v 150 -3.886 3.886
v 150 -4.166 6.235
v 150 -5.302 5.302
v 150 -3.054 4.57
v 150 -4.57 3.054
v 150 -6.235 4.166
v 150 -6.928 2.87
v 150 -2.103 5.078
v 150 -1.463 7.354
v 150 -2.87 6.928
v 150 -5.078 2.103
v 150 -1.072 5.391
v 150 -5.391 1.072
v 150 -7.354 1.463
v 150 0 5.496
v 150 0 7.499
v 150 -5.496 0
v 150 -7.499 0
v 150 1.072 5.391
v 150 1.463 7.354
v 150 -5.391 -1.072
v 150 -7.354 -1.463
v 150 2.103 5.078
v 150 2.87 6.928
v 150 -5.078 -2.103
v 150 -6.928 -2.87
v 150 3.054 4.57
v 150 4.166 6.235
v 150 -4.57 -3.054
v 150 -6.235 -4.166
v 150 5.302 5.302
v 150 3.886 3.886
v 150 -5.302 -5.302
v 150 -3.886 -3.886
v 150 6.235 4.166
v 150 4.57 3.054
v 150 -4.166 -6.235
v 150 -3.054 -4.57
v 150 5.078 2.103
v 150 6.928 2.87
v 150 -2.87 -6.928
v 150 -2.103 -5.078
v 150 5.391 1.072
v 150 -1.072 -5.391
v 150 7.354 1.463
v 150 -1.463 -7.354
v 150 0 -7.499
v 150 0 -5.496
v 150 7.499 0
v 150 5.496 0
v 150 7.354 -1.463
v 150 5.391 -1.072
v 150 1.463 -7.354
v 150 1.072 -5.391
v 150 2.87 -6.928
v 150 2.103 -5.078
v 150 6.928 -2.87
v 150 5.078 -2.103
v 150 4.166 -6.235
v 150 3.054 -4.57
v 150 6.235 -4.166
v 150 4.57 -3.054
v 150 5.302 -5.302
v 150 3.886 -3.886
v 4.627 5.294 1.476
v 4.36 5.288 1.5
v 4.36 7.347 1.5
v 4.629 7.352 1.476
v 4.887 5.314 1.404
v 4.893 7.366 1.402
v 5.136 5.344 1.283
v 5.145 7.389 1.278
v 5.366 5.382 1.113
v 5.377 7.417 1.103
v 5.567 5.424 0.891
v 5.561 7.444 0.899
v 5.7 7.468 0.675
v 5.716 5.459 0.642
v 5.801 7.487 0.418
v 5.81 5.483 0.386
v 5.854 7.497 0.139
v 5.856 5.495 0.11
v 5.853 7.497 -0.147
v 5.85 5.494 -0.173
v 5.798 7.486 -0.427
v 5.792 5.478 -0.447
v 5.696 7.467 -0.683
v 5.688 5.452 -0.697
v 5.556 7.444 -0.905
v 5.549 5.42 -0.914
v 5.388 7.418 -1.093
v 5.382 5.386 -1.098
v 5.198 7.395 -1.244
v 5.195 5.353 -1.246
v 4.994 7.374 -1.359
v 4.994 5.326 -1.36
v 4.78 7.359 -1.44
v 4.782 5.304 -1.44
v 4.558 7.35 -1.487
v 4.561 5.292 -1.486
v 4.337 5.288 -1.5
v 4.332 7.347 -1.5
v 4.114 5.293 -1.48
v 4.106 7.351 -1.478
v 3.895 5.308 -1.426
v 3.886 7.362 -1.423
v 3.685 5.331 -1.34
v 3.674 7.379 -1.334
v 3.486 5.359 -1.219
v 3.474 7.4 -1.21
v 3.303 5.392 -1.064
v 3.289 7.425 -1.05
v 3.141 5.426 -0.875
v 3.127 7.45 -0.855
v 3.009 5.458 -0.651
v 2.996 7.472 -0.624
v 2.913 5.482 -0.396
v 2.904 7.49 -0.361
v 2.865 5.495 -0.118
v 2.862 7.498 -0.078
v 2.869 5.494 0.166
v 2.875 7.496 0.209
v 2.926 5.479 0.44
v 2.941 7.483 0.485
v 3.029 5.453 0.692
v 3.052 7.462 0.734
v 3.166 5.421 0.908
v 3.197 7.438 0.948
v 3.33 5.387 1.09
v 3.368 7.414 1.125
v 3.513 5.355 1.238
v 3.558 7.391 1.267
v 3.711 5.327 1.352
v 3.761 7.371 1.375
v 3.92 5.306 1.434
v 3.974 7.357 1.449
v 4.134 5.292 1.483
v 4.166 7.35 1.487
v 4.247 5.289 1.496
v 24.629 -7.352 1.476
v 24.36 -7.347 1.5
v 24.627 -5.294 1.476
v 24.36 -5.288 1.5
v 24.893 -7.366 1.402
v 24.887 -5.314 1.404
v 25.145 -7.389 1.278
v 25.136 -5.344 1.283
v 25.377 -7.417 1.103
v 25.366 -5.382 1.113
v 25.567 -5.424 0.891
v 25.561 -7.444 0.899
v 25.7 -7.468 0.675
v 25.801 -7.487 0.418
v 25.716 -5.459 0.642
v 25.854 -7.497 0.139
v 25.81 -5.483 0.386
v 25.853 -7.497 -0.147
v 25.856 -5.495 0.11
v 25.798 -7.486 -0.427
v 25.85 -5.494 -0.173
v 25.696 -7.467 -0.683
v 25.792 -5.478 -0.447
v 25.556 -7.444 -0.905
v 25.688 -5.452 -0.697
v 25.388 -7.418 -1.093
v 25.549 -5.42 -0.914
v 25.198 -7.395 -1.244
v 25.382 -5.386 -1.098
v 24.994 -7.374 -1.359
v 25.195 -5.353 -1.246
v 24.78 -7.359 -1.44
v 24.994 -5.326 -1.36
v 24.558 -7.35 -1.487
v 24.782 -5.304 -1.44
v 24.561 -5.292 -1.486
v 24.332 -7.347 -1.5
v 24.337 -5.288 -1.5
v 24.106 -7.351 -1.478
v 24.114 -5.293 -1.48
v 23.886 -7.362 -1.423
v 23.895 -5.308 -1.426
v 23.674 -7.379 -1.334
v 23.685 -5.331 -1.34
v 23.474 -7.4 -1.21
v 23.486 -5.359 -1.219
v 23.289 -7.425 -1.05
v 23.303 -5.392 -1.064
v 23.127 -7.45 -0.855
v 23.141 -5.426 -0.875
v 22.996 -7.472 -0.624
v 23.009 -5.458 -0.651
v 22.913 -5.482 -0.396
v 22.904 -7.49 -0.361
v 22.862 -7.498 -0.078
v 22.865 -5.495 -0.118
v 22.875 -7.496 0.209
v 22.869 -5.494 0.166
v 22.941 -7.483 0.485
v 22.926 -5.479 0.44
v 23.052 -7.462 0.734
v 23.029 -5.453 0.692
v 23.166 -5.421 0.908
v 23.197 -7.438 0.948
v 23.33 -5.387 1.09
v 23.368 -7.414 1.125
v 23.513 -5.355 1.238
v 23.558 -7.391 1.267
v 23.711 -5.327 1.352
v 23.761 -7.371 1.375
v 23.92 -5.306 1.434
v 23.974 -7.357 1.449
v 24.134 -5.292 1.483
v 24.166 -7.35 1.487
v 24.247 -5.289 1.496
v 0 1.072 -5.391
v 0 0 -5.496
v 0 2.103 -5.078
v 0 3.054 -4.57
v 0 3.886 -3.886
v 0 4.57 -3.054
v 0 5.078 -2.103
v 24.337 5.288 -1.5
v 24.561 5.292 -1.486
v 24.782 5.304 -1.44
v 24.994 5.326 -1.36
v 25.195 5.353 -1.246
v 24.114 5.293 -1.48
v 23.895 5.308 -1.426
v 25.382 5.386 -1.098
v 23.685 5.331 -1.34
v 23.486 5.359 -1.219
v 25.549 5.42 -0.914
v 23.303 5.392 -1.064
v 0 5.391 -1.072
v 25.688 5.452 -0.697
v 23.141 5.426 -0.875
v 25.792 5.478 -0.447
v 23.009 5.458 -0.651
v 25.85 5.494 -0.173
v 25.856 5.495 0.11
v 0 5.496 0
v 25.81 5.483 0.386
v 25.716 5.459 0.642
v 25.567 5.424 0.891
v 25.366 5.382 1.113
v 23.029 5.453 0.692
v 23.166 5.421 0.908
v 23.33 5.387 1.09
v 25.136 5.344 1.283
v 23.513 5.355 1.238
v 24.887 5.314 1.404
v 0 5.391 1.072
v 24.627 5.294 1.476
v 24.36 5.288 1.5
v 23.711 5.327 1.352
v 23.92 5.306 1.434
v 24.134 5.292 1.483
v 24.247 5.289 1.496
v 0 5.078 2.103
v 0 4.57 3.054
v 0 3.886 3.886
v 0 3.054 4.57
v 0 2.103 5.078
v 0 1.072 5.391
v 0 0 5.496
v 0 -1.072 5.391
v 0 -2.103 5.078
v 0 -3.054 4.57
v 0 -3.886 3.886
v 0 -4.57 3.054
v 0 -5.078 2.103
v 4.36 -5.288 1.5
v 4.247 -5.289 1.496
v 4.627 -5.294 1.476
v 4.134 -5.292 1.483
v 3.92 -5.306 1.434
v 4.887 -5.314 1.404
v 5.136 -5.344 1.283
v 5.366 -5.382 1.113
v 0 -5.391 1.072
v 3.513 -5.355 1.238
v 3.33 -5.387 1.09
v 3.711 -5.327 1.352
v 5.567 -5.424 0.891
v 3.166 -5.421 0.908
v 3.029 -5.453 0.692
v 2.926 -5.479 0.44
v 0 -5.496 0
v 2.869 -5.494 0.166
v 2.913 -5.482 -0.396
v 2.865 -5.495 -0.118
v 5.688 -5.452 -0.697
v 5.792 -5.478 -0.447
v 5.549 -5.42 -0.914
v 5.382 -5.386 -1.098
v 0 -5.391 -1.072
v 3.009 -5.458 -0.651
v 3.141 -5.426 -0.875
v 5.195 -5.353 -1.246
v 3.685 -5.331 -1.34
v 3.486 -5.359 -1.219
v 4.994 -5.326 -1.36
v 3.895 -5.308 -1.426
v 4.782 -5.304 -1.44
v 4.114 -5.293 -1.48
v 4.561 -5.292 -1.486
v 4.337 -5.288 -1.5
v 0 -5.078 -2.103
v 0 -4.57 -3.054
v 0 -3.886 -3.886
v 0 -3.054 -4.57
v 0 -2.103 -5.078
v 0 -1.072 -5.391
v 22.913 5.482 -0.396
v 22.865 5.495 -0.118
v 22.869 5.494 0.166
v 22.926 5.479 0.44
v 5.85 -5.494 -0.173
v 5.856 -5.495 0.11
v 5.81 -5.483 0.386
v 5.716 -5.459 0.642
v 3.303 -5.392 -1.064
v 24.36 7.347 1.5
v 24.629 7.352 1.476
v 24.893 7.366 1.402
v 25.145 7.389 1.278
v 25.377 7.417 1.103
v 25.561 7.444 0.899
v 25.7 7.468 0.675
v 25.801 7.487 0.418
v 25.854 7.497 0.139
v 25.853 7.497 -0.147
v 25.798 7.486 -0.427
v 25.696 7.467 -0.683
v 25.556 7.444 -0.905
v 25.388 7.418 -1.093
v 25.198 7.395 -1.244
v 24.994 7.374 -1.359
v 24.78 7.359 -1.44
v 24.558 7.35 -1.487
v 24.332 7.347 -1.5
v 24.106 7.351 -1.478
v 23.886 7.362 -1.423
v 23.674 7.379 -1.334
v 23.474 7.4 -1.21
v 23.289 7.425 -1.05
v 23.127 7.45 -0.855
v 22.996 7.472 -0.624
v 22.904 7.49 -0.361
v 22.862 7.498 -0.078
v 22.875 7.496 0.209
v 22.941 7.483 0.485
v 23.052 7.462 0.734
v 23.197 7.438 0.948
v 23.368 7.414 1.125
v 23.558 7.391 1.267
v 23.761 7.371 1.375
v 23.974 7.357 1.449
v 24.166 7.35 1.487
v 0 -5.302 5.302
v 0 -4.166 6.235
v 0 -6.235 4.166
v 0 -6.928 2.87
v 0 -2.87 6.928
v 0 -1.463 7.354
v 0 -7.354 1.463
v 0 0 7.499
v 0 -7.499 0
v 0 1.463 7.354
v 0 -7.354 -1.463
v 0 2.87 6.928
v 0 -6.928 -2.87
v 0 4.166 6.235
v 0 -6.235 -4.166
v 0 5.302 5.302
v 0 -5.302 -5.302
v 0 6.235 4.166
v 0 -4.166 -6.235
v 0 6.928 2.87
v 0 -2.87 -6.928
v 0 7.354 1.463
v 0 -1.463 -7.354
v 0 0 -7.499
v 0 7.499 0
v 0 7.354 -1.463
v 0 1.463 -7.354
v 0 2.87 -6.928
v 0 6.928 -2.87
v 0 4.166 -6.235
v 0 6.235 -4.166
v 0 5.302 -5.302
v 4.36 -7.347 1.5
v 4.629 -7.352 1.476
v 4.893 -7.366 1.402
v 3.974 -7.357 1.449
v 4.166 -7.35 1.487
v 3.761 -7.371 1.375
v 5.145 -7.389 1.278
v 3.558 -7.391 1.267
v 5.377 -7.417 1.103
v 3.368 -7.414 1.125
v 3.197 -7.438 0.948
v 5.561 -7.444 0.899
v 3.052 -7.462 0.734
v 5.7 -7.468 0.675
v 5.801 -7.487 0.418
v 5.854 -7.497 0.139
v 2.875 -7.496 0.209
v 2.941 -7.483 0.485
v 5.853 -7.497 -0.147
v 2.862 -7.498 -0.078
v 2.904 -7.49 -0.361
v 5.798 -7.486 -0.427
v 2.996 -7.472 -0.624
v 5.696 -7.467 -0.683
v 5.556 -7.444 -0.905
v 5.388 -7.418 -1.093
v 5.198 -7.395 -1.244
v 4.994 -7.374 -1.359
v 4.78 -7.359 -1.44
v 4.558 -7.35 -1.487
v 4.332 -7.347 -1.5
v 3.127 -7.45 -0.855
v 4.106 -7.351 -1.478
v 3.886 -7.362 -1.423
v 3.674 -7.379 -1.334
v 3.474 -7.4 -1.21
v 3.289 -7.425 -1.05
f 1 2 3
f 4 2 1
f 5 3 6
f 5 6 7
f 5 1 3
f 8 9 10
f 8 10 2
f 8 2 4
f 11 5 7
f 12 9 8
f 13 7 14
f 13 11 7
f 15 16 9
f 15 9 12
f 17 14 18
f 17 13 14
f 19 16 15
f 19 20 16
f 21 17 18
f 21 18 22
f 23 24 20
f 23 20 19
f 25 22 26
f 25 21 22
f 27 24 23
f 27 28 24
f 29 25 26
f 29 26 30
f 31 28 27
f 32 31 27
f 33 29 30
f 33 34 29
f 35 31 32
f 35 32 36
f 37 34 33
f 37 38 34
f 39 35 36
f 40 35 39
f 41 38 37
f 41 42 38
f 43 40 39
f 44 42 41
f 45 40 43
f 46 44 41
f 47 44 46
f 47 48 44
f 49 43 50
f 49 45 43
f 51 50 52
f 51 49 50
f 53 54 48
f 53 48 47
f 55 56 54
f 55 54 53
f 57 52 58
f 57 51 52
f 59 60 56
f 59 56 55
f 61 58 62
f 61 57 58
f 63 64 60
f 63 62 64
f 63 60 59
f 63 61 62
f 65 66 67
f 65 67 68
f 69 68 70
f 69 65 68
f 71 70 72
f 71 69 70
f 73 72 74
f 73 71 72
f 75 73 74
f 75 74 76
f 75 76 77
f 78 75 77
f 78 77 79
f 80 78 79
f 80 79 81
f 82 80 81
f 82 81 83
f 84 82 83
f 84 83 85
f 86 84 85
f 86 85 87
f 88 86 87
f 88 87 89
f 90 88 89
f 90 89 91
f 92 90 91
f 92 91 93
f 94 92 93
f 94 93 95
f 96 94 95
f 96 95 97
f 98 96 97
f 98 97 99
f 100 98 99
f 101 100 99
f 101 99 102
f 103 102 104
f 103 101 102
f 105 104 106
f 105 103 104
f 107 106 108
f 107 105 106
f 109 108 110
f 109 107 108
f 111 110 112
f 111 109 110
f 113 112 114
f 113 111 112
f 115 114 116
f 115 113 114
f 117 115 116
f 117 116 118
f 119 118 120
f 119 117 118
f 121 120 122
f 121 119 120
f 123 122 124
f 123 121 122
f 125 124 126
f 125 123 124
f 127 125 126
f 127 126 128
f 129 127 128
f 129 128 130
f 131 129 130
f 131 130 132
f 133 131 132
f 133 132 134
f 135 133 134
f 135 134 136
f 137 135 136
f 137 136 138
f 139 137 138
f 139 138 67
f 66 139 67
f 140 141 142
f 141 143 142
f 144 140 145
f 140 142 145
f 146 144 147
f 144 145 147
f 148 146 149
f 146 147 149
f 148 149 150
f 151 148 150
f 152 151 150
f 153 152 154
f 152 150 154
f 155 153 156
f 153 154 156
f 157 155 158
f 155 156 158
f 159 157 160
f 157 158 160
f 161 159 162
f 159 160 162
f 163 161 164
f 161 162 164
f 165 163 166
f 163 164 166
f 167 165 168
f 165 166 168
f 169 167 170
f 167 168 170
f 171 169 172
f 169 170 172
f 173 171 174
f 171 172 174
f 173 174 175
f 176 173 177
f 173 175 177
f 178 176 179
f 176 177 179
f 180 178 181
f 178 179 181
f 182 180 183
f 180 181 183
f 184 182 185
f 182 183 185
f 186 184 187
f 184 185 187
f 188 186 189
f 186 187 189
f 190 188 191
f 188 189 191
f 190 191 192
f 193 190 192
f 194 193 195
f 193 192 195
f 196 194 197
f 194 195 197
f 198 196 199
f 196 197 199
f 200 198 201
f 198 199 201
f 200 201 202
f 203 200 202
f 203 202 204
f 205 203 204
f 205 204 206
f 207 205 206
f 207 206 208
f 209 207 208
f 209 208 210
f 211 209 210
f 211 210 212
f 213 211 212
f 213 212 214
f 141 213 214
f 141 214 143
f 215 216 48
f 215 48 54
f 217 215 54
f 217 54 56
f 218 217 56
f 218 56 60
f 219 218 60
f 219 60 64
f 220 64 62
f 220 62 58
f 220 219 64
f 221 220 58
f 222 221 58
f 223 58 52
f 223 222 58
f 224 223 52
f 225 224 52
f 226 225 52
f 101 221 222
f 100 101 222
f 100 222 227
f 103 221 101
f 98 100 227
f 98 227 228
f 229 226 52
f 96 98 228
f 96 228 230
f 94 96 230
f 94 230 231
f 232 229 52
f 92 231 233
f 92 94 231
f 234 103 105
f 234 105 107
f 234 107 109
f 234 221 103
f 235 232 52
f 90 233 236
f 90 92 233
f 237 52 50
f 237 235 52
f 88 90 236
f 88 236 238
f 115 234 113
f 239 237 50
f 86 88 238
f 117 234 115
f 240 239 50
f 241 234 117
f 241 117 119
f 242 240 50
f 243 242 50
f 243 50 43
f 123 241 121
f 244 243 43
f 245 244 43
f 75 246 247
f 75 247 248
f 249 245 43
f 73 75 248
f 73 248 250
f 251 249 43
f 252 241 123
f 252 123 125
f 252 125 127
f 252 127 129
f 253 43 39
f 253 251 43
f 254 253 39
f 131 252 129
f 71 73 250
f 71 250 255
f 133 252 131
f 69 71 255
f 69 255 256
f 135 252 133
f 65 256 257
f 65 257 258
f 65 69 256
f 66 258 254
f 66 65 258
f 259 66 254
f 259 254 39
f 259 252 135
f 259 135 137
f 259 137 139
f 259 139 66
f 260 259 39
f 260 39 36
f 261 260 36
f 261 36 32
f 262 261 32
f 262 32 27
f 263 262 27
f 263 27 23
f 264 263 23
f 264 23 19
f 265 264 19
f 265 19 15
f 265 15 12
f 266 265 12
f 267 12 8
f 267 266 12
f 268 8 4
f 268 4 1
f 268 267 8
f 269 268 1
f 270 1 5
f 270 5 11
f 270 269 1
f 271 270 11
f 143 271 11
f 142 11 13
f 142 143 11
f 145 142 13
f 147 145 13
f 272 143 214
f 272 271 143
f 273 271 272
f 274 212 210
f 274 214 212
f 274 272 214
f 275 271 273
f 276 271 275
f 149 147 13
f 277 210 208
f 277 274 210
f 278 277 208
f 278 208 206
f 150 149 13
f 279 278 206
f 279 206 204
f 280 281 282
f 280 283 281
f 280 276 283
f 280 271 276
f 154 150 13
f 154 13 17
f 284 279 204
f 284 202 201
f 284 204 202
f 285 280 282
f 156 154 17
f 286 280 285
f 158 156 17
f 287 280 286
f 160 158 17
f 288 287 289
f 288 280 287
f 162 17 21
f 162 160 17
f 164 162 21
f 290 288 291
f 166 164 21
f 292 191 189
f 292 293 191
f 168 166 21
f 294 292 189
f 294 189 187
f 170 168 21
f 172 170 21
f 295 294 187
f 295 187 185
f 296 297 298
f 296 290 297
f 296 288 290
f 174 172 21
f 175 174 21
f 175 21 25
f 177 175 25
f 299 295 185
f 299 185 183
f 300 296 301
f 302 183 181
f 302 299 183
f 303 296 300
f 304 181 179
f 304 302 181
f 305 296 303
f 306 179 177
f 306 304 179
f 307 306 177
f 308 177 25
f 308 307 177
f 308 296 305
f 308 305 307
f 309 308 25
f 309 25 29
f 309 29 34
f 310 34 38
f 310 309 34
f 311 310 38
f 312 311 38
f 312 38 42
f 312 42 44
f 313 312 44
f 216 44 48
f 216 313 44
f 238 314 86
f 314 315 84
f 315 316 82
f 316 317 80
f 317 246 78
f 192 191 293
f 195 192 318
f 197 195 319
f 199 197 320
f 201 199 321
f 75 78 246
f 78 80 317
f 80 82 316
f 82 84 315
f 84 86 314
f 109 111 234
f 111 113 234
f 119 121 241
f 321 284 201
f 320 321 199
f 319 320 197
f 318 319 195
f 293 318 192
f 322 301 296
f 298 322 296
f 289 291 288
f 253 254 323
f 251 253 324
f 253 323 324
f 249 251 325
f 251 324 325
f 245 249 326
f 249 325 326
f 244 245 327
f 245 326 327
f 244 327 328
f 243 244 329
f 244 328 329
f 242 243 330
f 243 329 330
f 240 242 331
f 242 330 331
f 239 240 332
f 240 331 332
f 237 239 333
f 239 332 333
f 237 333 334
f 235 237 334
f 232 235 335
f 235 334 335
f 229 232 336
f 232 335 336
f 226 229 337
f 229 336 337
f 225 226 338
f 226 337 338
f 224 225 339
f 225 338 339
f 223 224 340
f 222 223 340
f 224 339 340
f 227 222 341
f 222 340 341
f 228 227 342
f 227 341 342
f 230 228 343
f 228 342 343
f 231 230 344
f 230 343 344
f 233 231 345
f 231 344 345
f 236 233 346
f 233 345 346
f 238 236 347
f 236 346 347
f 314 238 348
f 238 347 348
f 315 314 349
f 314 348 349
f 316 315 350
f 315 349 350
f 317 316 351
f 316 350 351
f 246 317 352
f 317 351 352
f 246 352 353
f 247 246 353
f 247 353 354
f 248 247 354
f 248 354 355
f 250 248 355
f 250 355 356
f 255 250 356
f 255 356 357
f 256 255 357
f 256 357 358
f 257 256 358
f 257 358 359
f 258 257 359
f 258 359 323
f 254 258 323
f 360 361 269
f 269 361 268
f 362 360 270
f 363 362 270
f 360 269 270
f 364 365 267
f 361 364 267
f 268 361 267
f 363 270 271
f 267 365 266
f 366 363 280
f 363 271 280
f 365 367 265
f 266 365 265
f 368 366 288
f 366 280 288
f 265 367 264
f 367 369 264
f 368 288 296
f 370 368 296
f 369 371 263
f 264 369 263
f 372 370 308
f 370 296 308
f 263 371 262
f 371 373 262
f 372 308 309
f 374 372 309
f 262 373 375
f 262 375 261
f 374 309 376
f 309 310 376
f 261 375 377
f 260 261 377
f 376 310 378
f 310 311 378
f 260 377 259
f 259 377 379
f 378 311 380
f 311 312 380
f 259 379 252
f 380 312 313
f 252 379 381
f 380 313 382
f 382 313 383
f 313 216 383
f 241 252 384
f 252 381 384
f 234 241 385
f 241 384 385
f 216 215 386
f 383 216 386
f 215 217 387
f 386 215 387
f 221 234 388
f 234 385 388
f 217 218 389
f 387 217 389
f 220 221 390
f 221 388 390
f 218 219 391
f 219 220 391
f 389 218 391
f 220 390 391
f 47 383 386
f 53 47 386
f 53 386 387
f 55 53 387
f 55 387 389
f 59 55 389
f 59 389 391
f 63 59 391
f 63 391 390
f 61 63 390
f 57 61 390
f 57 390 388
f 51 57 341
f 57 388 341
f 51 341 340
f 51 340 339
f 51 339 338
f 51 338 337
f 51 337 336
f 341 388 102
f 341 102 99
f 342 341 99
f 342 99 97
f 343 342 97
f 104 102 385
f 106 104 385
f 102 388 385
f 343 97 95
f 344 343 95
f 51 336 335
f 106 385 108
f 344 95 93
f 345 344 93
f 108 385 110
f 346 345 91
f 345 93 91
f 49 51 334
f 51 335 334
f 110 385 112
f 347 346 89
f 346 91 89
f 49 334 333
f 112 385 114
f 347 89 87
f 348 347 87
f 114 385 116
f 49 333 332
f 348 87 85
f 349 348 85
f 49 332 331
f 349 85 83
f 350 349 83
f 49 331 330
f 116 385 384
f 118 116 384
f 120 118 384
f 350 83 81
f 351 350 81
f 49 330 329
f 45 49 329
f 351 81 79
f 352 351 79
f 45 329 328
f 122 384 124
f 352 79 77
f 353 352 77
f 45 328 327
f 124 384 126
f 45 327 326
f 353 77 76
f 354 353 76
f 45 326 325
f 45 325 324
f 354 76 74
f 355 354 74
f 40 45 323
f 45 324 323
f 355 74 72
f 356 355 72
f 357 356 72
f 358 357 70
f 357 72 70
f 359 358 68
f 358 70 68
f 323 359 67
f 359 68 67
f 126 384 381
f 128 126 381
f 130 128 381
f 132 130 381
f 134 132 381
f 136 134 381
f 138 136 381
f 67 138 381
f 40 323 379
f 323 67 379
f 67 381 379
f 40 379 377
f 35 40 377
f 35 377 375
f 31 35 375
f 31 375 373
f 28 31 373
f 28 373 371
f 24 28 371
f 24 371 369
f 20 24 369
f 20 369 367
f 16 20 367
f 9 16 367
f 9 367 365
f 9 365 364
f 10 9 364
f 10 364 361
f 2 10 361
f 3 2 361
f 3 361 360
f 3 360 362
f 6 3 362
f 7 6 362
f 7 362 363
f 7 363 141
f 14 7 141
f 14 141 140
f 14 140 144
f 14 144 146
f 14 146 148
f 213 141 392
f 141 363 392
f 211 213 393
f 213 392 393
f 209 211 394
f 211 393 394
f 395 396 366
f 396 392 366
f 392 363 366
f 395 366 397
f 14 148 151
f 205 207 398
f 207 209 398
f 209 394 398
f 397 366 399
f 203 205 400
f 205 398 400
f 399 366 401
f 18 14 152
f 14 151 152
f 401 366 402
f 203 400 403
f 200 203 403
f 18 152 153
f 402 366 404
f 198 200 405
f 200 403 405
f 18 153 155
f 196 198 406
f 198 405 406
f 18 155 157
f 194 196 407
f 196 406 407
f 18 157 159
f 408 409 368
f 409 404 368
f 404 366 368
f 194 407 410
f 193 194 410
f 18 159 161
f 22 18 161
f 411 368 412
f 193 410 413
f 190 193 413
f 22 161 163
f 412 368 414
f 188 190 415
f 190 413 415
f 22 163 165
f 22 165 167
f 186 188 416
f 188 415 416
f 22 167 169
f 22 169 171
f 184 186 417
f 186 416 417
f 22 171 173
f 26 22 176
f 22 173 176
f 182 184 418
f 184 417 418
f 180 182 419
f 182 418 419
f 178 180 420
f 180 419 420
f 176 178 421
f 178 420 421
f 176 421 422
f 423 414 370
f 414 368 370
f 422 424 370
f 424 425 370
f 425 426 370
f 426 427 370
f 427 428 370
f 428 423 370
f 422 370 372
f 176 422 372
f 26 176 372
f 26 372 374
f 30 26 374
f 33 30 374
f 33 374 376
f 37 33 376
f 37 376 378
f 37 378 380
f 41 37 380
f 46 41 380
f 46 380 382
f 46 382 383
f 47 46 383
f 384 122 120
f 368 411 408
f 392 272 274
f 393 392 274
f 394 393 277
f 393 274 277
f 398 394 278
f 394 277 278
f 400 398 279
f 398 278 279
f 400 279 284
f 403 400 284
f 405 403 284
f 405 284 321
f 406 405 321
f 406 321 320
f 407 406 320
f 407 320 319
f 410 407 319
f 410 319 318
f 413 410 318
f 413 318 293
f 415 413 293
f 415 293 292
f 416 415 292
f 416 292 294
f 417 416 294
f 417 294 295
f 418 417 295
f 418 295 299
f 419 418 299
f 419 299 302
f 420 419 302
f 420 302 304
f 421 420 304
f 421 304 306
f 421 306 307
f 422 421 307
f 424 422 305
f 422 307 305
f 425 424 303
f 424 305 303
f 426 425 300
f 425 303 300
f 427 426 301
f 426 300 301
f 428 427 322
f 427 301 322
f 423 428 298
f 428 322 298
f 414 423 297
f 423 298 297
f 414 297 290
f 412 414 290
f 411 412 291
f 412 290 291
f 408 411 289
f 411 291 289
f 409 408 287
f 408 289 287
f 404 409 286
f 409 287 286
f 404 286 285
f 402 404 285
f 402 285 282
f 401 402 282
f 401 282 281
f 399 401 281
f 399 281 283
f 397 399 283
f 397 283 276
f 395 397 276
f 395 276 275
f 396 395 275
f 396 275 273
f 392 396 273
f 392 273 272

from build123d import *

# Parameters (mm, degrees)
SKETCH_1_R          = 7.498521941
SKETCH_1_R_2        = 5.496326061
EXTRUDE_1_DEPTH     = 150
SKETCH_2_R          = 1.5
CUT_EXTRUDE_1_DEPTH = 14


with BuildPart() as part:
    # 草图1 → 凸台-拉伸1 (new body)
    with BuildSketch(Plane(origin=(0, 0, 0), x_dir=(0, 0, -1), z_dir=(1, 0, 0))):
        Circle(SKETCH_1_R)
        Circle(SKETCH_1_R_2, mode=Mode.SUBTRACT)
    extrude(amount=EXTRUDE_1_DEPTH)

    # 草图2 → 切除-拉伸1 (cut, symmetric)
    with BuildSketch(Plane(origin=(0, 0, 0), x_dir=(1, 0, 0), z_dir=(0, 1, 0))):
        with Locations(Location((4.36, 0, 0), (0, 0, 270))):
            Circle(SKETCH_2_R)
        with Locations(Location((24.36, 0, 0), (0, 0, 270))):
            Circle(SKETCH_2_R)
    extrude(amount=CUT_EXTRUDE_1_DEPTH, both=True, mode=Mode.SUBTRACT)


solid = part.part
